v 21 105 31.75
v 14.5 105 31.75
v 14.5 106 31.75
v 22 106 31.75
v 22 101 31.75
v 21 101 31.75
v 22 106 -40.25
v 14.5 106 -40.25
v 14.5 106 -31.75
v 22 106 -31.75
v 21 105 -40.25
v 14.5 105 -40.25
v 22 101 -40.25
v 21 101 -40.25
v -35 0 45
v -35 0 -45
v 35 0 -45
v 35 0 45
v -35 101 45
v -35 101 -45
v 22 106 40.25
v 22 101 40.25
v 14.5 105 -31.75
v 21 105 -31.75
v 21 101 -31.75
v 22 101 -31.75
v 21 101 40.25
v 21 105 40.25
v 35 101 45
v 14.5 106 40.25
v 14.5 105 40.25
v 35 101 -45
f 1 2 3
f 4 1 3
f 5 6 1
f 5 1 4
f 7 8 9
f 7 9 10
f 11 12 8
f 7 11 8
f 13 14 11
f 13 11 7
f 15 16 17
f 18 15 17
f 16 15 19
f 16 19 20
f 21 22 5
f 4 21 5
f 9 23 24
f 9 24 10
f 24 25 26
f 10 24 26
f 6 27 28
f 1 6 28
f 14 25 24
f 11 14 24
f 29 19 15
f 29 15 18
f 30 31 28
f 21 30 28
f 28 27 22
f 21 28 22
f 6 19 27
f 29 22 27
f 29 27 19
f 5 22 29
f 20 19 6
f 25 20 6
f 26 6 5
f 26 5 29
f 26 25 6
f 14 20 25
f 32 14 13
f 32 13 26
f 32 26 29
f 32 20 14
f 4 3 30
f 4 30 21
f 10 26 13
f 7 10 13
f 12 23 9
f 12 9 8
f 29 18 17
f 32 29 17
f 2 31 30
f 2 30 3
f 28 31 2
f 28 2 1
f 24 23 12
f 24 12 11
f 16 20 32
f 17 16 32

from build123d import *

# Parameters (mm, degrees)
SKETCH_2_W          = 70
SKETCH_2_H          = 90
EXTRUDE_1_DEPTH     = 101
SKETCH_3_W          = 7.5
SKETCH_3_H          = 8.5
EXTRUDE_1_2_DEPTH   = 5
SKETCH_4_W          = 6.5
SKETCH_4_H          = 4
CUT_EXTRUDE_1_DEPTH = 141.458401315


with BuildPart() as part:
    # 草图2 → Extrude 1 (new body)
    with BuildSketch(Plane(origin=(0, 0, 0), x_dir=(1, 0, 0), z_dir=(0, 1, 0))):
        Rectangle(SKETCH_2_W, SKETCH_2_H)
    extrude(amount=EXTRUDE_1_DEPTH)

    # 草图3 → Extrude 1 2 (add)
    with BuildSketch(Plane(origin=(0, 101, 0), x_dir=(1, 0, 0), z_dir=(0, 1, 0))):
        with Locations((18.25, 36)):
            Rectangle(SKETCH_3_W, SKETCH_3_H)
        with Locations((18.25, -36)):
            Rectangle(SKETCH_3_W, SKETCH_3_H)
    extrude(amount=EXTRUDE_1_2_DEPTH)

    # 草图4 → 切除-拉伸1 (cut, through all)
    with BuildSketch(Plane.XY.offset(40.25)):
        with Locations((17.75, 103)):
            Rectangle(SKETCH_4_W, SKETCH_4_H)
    extrude(amount=-CUT_EXTRUDE_1_DEPTH, mode=Mode.SUBTRACT)


solid = part.part
